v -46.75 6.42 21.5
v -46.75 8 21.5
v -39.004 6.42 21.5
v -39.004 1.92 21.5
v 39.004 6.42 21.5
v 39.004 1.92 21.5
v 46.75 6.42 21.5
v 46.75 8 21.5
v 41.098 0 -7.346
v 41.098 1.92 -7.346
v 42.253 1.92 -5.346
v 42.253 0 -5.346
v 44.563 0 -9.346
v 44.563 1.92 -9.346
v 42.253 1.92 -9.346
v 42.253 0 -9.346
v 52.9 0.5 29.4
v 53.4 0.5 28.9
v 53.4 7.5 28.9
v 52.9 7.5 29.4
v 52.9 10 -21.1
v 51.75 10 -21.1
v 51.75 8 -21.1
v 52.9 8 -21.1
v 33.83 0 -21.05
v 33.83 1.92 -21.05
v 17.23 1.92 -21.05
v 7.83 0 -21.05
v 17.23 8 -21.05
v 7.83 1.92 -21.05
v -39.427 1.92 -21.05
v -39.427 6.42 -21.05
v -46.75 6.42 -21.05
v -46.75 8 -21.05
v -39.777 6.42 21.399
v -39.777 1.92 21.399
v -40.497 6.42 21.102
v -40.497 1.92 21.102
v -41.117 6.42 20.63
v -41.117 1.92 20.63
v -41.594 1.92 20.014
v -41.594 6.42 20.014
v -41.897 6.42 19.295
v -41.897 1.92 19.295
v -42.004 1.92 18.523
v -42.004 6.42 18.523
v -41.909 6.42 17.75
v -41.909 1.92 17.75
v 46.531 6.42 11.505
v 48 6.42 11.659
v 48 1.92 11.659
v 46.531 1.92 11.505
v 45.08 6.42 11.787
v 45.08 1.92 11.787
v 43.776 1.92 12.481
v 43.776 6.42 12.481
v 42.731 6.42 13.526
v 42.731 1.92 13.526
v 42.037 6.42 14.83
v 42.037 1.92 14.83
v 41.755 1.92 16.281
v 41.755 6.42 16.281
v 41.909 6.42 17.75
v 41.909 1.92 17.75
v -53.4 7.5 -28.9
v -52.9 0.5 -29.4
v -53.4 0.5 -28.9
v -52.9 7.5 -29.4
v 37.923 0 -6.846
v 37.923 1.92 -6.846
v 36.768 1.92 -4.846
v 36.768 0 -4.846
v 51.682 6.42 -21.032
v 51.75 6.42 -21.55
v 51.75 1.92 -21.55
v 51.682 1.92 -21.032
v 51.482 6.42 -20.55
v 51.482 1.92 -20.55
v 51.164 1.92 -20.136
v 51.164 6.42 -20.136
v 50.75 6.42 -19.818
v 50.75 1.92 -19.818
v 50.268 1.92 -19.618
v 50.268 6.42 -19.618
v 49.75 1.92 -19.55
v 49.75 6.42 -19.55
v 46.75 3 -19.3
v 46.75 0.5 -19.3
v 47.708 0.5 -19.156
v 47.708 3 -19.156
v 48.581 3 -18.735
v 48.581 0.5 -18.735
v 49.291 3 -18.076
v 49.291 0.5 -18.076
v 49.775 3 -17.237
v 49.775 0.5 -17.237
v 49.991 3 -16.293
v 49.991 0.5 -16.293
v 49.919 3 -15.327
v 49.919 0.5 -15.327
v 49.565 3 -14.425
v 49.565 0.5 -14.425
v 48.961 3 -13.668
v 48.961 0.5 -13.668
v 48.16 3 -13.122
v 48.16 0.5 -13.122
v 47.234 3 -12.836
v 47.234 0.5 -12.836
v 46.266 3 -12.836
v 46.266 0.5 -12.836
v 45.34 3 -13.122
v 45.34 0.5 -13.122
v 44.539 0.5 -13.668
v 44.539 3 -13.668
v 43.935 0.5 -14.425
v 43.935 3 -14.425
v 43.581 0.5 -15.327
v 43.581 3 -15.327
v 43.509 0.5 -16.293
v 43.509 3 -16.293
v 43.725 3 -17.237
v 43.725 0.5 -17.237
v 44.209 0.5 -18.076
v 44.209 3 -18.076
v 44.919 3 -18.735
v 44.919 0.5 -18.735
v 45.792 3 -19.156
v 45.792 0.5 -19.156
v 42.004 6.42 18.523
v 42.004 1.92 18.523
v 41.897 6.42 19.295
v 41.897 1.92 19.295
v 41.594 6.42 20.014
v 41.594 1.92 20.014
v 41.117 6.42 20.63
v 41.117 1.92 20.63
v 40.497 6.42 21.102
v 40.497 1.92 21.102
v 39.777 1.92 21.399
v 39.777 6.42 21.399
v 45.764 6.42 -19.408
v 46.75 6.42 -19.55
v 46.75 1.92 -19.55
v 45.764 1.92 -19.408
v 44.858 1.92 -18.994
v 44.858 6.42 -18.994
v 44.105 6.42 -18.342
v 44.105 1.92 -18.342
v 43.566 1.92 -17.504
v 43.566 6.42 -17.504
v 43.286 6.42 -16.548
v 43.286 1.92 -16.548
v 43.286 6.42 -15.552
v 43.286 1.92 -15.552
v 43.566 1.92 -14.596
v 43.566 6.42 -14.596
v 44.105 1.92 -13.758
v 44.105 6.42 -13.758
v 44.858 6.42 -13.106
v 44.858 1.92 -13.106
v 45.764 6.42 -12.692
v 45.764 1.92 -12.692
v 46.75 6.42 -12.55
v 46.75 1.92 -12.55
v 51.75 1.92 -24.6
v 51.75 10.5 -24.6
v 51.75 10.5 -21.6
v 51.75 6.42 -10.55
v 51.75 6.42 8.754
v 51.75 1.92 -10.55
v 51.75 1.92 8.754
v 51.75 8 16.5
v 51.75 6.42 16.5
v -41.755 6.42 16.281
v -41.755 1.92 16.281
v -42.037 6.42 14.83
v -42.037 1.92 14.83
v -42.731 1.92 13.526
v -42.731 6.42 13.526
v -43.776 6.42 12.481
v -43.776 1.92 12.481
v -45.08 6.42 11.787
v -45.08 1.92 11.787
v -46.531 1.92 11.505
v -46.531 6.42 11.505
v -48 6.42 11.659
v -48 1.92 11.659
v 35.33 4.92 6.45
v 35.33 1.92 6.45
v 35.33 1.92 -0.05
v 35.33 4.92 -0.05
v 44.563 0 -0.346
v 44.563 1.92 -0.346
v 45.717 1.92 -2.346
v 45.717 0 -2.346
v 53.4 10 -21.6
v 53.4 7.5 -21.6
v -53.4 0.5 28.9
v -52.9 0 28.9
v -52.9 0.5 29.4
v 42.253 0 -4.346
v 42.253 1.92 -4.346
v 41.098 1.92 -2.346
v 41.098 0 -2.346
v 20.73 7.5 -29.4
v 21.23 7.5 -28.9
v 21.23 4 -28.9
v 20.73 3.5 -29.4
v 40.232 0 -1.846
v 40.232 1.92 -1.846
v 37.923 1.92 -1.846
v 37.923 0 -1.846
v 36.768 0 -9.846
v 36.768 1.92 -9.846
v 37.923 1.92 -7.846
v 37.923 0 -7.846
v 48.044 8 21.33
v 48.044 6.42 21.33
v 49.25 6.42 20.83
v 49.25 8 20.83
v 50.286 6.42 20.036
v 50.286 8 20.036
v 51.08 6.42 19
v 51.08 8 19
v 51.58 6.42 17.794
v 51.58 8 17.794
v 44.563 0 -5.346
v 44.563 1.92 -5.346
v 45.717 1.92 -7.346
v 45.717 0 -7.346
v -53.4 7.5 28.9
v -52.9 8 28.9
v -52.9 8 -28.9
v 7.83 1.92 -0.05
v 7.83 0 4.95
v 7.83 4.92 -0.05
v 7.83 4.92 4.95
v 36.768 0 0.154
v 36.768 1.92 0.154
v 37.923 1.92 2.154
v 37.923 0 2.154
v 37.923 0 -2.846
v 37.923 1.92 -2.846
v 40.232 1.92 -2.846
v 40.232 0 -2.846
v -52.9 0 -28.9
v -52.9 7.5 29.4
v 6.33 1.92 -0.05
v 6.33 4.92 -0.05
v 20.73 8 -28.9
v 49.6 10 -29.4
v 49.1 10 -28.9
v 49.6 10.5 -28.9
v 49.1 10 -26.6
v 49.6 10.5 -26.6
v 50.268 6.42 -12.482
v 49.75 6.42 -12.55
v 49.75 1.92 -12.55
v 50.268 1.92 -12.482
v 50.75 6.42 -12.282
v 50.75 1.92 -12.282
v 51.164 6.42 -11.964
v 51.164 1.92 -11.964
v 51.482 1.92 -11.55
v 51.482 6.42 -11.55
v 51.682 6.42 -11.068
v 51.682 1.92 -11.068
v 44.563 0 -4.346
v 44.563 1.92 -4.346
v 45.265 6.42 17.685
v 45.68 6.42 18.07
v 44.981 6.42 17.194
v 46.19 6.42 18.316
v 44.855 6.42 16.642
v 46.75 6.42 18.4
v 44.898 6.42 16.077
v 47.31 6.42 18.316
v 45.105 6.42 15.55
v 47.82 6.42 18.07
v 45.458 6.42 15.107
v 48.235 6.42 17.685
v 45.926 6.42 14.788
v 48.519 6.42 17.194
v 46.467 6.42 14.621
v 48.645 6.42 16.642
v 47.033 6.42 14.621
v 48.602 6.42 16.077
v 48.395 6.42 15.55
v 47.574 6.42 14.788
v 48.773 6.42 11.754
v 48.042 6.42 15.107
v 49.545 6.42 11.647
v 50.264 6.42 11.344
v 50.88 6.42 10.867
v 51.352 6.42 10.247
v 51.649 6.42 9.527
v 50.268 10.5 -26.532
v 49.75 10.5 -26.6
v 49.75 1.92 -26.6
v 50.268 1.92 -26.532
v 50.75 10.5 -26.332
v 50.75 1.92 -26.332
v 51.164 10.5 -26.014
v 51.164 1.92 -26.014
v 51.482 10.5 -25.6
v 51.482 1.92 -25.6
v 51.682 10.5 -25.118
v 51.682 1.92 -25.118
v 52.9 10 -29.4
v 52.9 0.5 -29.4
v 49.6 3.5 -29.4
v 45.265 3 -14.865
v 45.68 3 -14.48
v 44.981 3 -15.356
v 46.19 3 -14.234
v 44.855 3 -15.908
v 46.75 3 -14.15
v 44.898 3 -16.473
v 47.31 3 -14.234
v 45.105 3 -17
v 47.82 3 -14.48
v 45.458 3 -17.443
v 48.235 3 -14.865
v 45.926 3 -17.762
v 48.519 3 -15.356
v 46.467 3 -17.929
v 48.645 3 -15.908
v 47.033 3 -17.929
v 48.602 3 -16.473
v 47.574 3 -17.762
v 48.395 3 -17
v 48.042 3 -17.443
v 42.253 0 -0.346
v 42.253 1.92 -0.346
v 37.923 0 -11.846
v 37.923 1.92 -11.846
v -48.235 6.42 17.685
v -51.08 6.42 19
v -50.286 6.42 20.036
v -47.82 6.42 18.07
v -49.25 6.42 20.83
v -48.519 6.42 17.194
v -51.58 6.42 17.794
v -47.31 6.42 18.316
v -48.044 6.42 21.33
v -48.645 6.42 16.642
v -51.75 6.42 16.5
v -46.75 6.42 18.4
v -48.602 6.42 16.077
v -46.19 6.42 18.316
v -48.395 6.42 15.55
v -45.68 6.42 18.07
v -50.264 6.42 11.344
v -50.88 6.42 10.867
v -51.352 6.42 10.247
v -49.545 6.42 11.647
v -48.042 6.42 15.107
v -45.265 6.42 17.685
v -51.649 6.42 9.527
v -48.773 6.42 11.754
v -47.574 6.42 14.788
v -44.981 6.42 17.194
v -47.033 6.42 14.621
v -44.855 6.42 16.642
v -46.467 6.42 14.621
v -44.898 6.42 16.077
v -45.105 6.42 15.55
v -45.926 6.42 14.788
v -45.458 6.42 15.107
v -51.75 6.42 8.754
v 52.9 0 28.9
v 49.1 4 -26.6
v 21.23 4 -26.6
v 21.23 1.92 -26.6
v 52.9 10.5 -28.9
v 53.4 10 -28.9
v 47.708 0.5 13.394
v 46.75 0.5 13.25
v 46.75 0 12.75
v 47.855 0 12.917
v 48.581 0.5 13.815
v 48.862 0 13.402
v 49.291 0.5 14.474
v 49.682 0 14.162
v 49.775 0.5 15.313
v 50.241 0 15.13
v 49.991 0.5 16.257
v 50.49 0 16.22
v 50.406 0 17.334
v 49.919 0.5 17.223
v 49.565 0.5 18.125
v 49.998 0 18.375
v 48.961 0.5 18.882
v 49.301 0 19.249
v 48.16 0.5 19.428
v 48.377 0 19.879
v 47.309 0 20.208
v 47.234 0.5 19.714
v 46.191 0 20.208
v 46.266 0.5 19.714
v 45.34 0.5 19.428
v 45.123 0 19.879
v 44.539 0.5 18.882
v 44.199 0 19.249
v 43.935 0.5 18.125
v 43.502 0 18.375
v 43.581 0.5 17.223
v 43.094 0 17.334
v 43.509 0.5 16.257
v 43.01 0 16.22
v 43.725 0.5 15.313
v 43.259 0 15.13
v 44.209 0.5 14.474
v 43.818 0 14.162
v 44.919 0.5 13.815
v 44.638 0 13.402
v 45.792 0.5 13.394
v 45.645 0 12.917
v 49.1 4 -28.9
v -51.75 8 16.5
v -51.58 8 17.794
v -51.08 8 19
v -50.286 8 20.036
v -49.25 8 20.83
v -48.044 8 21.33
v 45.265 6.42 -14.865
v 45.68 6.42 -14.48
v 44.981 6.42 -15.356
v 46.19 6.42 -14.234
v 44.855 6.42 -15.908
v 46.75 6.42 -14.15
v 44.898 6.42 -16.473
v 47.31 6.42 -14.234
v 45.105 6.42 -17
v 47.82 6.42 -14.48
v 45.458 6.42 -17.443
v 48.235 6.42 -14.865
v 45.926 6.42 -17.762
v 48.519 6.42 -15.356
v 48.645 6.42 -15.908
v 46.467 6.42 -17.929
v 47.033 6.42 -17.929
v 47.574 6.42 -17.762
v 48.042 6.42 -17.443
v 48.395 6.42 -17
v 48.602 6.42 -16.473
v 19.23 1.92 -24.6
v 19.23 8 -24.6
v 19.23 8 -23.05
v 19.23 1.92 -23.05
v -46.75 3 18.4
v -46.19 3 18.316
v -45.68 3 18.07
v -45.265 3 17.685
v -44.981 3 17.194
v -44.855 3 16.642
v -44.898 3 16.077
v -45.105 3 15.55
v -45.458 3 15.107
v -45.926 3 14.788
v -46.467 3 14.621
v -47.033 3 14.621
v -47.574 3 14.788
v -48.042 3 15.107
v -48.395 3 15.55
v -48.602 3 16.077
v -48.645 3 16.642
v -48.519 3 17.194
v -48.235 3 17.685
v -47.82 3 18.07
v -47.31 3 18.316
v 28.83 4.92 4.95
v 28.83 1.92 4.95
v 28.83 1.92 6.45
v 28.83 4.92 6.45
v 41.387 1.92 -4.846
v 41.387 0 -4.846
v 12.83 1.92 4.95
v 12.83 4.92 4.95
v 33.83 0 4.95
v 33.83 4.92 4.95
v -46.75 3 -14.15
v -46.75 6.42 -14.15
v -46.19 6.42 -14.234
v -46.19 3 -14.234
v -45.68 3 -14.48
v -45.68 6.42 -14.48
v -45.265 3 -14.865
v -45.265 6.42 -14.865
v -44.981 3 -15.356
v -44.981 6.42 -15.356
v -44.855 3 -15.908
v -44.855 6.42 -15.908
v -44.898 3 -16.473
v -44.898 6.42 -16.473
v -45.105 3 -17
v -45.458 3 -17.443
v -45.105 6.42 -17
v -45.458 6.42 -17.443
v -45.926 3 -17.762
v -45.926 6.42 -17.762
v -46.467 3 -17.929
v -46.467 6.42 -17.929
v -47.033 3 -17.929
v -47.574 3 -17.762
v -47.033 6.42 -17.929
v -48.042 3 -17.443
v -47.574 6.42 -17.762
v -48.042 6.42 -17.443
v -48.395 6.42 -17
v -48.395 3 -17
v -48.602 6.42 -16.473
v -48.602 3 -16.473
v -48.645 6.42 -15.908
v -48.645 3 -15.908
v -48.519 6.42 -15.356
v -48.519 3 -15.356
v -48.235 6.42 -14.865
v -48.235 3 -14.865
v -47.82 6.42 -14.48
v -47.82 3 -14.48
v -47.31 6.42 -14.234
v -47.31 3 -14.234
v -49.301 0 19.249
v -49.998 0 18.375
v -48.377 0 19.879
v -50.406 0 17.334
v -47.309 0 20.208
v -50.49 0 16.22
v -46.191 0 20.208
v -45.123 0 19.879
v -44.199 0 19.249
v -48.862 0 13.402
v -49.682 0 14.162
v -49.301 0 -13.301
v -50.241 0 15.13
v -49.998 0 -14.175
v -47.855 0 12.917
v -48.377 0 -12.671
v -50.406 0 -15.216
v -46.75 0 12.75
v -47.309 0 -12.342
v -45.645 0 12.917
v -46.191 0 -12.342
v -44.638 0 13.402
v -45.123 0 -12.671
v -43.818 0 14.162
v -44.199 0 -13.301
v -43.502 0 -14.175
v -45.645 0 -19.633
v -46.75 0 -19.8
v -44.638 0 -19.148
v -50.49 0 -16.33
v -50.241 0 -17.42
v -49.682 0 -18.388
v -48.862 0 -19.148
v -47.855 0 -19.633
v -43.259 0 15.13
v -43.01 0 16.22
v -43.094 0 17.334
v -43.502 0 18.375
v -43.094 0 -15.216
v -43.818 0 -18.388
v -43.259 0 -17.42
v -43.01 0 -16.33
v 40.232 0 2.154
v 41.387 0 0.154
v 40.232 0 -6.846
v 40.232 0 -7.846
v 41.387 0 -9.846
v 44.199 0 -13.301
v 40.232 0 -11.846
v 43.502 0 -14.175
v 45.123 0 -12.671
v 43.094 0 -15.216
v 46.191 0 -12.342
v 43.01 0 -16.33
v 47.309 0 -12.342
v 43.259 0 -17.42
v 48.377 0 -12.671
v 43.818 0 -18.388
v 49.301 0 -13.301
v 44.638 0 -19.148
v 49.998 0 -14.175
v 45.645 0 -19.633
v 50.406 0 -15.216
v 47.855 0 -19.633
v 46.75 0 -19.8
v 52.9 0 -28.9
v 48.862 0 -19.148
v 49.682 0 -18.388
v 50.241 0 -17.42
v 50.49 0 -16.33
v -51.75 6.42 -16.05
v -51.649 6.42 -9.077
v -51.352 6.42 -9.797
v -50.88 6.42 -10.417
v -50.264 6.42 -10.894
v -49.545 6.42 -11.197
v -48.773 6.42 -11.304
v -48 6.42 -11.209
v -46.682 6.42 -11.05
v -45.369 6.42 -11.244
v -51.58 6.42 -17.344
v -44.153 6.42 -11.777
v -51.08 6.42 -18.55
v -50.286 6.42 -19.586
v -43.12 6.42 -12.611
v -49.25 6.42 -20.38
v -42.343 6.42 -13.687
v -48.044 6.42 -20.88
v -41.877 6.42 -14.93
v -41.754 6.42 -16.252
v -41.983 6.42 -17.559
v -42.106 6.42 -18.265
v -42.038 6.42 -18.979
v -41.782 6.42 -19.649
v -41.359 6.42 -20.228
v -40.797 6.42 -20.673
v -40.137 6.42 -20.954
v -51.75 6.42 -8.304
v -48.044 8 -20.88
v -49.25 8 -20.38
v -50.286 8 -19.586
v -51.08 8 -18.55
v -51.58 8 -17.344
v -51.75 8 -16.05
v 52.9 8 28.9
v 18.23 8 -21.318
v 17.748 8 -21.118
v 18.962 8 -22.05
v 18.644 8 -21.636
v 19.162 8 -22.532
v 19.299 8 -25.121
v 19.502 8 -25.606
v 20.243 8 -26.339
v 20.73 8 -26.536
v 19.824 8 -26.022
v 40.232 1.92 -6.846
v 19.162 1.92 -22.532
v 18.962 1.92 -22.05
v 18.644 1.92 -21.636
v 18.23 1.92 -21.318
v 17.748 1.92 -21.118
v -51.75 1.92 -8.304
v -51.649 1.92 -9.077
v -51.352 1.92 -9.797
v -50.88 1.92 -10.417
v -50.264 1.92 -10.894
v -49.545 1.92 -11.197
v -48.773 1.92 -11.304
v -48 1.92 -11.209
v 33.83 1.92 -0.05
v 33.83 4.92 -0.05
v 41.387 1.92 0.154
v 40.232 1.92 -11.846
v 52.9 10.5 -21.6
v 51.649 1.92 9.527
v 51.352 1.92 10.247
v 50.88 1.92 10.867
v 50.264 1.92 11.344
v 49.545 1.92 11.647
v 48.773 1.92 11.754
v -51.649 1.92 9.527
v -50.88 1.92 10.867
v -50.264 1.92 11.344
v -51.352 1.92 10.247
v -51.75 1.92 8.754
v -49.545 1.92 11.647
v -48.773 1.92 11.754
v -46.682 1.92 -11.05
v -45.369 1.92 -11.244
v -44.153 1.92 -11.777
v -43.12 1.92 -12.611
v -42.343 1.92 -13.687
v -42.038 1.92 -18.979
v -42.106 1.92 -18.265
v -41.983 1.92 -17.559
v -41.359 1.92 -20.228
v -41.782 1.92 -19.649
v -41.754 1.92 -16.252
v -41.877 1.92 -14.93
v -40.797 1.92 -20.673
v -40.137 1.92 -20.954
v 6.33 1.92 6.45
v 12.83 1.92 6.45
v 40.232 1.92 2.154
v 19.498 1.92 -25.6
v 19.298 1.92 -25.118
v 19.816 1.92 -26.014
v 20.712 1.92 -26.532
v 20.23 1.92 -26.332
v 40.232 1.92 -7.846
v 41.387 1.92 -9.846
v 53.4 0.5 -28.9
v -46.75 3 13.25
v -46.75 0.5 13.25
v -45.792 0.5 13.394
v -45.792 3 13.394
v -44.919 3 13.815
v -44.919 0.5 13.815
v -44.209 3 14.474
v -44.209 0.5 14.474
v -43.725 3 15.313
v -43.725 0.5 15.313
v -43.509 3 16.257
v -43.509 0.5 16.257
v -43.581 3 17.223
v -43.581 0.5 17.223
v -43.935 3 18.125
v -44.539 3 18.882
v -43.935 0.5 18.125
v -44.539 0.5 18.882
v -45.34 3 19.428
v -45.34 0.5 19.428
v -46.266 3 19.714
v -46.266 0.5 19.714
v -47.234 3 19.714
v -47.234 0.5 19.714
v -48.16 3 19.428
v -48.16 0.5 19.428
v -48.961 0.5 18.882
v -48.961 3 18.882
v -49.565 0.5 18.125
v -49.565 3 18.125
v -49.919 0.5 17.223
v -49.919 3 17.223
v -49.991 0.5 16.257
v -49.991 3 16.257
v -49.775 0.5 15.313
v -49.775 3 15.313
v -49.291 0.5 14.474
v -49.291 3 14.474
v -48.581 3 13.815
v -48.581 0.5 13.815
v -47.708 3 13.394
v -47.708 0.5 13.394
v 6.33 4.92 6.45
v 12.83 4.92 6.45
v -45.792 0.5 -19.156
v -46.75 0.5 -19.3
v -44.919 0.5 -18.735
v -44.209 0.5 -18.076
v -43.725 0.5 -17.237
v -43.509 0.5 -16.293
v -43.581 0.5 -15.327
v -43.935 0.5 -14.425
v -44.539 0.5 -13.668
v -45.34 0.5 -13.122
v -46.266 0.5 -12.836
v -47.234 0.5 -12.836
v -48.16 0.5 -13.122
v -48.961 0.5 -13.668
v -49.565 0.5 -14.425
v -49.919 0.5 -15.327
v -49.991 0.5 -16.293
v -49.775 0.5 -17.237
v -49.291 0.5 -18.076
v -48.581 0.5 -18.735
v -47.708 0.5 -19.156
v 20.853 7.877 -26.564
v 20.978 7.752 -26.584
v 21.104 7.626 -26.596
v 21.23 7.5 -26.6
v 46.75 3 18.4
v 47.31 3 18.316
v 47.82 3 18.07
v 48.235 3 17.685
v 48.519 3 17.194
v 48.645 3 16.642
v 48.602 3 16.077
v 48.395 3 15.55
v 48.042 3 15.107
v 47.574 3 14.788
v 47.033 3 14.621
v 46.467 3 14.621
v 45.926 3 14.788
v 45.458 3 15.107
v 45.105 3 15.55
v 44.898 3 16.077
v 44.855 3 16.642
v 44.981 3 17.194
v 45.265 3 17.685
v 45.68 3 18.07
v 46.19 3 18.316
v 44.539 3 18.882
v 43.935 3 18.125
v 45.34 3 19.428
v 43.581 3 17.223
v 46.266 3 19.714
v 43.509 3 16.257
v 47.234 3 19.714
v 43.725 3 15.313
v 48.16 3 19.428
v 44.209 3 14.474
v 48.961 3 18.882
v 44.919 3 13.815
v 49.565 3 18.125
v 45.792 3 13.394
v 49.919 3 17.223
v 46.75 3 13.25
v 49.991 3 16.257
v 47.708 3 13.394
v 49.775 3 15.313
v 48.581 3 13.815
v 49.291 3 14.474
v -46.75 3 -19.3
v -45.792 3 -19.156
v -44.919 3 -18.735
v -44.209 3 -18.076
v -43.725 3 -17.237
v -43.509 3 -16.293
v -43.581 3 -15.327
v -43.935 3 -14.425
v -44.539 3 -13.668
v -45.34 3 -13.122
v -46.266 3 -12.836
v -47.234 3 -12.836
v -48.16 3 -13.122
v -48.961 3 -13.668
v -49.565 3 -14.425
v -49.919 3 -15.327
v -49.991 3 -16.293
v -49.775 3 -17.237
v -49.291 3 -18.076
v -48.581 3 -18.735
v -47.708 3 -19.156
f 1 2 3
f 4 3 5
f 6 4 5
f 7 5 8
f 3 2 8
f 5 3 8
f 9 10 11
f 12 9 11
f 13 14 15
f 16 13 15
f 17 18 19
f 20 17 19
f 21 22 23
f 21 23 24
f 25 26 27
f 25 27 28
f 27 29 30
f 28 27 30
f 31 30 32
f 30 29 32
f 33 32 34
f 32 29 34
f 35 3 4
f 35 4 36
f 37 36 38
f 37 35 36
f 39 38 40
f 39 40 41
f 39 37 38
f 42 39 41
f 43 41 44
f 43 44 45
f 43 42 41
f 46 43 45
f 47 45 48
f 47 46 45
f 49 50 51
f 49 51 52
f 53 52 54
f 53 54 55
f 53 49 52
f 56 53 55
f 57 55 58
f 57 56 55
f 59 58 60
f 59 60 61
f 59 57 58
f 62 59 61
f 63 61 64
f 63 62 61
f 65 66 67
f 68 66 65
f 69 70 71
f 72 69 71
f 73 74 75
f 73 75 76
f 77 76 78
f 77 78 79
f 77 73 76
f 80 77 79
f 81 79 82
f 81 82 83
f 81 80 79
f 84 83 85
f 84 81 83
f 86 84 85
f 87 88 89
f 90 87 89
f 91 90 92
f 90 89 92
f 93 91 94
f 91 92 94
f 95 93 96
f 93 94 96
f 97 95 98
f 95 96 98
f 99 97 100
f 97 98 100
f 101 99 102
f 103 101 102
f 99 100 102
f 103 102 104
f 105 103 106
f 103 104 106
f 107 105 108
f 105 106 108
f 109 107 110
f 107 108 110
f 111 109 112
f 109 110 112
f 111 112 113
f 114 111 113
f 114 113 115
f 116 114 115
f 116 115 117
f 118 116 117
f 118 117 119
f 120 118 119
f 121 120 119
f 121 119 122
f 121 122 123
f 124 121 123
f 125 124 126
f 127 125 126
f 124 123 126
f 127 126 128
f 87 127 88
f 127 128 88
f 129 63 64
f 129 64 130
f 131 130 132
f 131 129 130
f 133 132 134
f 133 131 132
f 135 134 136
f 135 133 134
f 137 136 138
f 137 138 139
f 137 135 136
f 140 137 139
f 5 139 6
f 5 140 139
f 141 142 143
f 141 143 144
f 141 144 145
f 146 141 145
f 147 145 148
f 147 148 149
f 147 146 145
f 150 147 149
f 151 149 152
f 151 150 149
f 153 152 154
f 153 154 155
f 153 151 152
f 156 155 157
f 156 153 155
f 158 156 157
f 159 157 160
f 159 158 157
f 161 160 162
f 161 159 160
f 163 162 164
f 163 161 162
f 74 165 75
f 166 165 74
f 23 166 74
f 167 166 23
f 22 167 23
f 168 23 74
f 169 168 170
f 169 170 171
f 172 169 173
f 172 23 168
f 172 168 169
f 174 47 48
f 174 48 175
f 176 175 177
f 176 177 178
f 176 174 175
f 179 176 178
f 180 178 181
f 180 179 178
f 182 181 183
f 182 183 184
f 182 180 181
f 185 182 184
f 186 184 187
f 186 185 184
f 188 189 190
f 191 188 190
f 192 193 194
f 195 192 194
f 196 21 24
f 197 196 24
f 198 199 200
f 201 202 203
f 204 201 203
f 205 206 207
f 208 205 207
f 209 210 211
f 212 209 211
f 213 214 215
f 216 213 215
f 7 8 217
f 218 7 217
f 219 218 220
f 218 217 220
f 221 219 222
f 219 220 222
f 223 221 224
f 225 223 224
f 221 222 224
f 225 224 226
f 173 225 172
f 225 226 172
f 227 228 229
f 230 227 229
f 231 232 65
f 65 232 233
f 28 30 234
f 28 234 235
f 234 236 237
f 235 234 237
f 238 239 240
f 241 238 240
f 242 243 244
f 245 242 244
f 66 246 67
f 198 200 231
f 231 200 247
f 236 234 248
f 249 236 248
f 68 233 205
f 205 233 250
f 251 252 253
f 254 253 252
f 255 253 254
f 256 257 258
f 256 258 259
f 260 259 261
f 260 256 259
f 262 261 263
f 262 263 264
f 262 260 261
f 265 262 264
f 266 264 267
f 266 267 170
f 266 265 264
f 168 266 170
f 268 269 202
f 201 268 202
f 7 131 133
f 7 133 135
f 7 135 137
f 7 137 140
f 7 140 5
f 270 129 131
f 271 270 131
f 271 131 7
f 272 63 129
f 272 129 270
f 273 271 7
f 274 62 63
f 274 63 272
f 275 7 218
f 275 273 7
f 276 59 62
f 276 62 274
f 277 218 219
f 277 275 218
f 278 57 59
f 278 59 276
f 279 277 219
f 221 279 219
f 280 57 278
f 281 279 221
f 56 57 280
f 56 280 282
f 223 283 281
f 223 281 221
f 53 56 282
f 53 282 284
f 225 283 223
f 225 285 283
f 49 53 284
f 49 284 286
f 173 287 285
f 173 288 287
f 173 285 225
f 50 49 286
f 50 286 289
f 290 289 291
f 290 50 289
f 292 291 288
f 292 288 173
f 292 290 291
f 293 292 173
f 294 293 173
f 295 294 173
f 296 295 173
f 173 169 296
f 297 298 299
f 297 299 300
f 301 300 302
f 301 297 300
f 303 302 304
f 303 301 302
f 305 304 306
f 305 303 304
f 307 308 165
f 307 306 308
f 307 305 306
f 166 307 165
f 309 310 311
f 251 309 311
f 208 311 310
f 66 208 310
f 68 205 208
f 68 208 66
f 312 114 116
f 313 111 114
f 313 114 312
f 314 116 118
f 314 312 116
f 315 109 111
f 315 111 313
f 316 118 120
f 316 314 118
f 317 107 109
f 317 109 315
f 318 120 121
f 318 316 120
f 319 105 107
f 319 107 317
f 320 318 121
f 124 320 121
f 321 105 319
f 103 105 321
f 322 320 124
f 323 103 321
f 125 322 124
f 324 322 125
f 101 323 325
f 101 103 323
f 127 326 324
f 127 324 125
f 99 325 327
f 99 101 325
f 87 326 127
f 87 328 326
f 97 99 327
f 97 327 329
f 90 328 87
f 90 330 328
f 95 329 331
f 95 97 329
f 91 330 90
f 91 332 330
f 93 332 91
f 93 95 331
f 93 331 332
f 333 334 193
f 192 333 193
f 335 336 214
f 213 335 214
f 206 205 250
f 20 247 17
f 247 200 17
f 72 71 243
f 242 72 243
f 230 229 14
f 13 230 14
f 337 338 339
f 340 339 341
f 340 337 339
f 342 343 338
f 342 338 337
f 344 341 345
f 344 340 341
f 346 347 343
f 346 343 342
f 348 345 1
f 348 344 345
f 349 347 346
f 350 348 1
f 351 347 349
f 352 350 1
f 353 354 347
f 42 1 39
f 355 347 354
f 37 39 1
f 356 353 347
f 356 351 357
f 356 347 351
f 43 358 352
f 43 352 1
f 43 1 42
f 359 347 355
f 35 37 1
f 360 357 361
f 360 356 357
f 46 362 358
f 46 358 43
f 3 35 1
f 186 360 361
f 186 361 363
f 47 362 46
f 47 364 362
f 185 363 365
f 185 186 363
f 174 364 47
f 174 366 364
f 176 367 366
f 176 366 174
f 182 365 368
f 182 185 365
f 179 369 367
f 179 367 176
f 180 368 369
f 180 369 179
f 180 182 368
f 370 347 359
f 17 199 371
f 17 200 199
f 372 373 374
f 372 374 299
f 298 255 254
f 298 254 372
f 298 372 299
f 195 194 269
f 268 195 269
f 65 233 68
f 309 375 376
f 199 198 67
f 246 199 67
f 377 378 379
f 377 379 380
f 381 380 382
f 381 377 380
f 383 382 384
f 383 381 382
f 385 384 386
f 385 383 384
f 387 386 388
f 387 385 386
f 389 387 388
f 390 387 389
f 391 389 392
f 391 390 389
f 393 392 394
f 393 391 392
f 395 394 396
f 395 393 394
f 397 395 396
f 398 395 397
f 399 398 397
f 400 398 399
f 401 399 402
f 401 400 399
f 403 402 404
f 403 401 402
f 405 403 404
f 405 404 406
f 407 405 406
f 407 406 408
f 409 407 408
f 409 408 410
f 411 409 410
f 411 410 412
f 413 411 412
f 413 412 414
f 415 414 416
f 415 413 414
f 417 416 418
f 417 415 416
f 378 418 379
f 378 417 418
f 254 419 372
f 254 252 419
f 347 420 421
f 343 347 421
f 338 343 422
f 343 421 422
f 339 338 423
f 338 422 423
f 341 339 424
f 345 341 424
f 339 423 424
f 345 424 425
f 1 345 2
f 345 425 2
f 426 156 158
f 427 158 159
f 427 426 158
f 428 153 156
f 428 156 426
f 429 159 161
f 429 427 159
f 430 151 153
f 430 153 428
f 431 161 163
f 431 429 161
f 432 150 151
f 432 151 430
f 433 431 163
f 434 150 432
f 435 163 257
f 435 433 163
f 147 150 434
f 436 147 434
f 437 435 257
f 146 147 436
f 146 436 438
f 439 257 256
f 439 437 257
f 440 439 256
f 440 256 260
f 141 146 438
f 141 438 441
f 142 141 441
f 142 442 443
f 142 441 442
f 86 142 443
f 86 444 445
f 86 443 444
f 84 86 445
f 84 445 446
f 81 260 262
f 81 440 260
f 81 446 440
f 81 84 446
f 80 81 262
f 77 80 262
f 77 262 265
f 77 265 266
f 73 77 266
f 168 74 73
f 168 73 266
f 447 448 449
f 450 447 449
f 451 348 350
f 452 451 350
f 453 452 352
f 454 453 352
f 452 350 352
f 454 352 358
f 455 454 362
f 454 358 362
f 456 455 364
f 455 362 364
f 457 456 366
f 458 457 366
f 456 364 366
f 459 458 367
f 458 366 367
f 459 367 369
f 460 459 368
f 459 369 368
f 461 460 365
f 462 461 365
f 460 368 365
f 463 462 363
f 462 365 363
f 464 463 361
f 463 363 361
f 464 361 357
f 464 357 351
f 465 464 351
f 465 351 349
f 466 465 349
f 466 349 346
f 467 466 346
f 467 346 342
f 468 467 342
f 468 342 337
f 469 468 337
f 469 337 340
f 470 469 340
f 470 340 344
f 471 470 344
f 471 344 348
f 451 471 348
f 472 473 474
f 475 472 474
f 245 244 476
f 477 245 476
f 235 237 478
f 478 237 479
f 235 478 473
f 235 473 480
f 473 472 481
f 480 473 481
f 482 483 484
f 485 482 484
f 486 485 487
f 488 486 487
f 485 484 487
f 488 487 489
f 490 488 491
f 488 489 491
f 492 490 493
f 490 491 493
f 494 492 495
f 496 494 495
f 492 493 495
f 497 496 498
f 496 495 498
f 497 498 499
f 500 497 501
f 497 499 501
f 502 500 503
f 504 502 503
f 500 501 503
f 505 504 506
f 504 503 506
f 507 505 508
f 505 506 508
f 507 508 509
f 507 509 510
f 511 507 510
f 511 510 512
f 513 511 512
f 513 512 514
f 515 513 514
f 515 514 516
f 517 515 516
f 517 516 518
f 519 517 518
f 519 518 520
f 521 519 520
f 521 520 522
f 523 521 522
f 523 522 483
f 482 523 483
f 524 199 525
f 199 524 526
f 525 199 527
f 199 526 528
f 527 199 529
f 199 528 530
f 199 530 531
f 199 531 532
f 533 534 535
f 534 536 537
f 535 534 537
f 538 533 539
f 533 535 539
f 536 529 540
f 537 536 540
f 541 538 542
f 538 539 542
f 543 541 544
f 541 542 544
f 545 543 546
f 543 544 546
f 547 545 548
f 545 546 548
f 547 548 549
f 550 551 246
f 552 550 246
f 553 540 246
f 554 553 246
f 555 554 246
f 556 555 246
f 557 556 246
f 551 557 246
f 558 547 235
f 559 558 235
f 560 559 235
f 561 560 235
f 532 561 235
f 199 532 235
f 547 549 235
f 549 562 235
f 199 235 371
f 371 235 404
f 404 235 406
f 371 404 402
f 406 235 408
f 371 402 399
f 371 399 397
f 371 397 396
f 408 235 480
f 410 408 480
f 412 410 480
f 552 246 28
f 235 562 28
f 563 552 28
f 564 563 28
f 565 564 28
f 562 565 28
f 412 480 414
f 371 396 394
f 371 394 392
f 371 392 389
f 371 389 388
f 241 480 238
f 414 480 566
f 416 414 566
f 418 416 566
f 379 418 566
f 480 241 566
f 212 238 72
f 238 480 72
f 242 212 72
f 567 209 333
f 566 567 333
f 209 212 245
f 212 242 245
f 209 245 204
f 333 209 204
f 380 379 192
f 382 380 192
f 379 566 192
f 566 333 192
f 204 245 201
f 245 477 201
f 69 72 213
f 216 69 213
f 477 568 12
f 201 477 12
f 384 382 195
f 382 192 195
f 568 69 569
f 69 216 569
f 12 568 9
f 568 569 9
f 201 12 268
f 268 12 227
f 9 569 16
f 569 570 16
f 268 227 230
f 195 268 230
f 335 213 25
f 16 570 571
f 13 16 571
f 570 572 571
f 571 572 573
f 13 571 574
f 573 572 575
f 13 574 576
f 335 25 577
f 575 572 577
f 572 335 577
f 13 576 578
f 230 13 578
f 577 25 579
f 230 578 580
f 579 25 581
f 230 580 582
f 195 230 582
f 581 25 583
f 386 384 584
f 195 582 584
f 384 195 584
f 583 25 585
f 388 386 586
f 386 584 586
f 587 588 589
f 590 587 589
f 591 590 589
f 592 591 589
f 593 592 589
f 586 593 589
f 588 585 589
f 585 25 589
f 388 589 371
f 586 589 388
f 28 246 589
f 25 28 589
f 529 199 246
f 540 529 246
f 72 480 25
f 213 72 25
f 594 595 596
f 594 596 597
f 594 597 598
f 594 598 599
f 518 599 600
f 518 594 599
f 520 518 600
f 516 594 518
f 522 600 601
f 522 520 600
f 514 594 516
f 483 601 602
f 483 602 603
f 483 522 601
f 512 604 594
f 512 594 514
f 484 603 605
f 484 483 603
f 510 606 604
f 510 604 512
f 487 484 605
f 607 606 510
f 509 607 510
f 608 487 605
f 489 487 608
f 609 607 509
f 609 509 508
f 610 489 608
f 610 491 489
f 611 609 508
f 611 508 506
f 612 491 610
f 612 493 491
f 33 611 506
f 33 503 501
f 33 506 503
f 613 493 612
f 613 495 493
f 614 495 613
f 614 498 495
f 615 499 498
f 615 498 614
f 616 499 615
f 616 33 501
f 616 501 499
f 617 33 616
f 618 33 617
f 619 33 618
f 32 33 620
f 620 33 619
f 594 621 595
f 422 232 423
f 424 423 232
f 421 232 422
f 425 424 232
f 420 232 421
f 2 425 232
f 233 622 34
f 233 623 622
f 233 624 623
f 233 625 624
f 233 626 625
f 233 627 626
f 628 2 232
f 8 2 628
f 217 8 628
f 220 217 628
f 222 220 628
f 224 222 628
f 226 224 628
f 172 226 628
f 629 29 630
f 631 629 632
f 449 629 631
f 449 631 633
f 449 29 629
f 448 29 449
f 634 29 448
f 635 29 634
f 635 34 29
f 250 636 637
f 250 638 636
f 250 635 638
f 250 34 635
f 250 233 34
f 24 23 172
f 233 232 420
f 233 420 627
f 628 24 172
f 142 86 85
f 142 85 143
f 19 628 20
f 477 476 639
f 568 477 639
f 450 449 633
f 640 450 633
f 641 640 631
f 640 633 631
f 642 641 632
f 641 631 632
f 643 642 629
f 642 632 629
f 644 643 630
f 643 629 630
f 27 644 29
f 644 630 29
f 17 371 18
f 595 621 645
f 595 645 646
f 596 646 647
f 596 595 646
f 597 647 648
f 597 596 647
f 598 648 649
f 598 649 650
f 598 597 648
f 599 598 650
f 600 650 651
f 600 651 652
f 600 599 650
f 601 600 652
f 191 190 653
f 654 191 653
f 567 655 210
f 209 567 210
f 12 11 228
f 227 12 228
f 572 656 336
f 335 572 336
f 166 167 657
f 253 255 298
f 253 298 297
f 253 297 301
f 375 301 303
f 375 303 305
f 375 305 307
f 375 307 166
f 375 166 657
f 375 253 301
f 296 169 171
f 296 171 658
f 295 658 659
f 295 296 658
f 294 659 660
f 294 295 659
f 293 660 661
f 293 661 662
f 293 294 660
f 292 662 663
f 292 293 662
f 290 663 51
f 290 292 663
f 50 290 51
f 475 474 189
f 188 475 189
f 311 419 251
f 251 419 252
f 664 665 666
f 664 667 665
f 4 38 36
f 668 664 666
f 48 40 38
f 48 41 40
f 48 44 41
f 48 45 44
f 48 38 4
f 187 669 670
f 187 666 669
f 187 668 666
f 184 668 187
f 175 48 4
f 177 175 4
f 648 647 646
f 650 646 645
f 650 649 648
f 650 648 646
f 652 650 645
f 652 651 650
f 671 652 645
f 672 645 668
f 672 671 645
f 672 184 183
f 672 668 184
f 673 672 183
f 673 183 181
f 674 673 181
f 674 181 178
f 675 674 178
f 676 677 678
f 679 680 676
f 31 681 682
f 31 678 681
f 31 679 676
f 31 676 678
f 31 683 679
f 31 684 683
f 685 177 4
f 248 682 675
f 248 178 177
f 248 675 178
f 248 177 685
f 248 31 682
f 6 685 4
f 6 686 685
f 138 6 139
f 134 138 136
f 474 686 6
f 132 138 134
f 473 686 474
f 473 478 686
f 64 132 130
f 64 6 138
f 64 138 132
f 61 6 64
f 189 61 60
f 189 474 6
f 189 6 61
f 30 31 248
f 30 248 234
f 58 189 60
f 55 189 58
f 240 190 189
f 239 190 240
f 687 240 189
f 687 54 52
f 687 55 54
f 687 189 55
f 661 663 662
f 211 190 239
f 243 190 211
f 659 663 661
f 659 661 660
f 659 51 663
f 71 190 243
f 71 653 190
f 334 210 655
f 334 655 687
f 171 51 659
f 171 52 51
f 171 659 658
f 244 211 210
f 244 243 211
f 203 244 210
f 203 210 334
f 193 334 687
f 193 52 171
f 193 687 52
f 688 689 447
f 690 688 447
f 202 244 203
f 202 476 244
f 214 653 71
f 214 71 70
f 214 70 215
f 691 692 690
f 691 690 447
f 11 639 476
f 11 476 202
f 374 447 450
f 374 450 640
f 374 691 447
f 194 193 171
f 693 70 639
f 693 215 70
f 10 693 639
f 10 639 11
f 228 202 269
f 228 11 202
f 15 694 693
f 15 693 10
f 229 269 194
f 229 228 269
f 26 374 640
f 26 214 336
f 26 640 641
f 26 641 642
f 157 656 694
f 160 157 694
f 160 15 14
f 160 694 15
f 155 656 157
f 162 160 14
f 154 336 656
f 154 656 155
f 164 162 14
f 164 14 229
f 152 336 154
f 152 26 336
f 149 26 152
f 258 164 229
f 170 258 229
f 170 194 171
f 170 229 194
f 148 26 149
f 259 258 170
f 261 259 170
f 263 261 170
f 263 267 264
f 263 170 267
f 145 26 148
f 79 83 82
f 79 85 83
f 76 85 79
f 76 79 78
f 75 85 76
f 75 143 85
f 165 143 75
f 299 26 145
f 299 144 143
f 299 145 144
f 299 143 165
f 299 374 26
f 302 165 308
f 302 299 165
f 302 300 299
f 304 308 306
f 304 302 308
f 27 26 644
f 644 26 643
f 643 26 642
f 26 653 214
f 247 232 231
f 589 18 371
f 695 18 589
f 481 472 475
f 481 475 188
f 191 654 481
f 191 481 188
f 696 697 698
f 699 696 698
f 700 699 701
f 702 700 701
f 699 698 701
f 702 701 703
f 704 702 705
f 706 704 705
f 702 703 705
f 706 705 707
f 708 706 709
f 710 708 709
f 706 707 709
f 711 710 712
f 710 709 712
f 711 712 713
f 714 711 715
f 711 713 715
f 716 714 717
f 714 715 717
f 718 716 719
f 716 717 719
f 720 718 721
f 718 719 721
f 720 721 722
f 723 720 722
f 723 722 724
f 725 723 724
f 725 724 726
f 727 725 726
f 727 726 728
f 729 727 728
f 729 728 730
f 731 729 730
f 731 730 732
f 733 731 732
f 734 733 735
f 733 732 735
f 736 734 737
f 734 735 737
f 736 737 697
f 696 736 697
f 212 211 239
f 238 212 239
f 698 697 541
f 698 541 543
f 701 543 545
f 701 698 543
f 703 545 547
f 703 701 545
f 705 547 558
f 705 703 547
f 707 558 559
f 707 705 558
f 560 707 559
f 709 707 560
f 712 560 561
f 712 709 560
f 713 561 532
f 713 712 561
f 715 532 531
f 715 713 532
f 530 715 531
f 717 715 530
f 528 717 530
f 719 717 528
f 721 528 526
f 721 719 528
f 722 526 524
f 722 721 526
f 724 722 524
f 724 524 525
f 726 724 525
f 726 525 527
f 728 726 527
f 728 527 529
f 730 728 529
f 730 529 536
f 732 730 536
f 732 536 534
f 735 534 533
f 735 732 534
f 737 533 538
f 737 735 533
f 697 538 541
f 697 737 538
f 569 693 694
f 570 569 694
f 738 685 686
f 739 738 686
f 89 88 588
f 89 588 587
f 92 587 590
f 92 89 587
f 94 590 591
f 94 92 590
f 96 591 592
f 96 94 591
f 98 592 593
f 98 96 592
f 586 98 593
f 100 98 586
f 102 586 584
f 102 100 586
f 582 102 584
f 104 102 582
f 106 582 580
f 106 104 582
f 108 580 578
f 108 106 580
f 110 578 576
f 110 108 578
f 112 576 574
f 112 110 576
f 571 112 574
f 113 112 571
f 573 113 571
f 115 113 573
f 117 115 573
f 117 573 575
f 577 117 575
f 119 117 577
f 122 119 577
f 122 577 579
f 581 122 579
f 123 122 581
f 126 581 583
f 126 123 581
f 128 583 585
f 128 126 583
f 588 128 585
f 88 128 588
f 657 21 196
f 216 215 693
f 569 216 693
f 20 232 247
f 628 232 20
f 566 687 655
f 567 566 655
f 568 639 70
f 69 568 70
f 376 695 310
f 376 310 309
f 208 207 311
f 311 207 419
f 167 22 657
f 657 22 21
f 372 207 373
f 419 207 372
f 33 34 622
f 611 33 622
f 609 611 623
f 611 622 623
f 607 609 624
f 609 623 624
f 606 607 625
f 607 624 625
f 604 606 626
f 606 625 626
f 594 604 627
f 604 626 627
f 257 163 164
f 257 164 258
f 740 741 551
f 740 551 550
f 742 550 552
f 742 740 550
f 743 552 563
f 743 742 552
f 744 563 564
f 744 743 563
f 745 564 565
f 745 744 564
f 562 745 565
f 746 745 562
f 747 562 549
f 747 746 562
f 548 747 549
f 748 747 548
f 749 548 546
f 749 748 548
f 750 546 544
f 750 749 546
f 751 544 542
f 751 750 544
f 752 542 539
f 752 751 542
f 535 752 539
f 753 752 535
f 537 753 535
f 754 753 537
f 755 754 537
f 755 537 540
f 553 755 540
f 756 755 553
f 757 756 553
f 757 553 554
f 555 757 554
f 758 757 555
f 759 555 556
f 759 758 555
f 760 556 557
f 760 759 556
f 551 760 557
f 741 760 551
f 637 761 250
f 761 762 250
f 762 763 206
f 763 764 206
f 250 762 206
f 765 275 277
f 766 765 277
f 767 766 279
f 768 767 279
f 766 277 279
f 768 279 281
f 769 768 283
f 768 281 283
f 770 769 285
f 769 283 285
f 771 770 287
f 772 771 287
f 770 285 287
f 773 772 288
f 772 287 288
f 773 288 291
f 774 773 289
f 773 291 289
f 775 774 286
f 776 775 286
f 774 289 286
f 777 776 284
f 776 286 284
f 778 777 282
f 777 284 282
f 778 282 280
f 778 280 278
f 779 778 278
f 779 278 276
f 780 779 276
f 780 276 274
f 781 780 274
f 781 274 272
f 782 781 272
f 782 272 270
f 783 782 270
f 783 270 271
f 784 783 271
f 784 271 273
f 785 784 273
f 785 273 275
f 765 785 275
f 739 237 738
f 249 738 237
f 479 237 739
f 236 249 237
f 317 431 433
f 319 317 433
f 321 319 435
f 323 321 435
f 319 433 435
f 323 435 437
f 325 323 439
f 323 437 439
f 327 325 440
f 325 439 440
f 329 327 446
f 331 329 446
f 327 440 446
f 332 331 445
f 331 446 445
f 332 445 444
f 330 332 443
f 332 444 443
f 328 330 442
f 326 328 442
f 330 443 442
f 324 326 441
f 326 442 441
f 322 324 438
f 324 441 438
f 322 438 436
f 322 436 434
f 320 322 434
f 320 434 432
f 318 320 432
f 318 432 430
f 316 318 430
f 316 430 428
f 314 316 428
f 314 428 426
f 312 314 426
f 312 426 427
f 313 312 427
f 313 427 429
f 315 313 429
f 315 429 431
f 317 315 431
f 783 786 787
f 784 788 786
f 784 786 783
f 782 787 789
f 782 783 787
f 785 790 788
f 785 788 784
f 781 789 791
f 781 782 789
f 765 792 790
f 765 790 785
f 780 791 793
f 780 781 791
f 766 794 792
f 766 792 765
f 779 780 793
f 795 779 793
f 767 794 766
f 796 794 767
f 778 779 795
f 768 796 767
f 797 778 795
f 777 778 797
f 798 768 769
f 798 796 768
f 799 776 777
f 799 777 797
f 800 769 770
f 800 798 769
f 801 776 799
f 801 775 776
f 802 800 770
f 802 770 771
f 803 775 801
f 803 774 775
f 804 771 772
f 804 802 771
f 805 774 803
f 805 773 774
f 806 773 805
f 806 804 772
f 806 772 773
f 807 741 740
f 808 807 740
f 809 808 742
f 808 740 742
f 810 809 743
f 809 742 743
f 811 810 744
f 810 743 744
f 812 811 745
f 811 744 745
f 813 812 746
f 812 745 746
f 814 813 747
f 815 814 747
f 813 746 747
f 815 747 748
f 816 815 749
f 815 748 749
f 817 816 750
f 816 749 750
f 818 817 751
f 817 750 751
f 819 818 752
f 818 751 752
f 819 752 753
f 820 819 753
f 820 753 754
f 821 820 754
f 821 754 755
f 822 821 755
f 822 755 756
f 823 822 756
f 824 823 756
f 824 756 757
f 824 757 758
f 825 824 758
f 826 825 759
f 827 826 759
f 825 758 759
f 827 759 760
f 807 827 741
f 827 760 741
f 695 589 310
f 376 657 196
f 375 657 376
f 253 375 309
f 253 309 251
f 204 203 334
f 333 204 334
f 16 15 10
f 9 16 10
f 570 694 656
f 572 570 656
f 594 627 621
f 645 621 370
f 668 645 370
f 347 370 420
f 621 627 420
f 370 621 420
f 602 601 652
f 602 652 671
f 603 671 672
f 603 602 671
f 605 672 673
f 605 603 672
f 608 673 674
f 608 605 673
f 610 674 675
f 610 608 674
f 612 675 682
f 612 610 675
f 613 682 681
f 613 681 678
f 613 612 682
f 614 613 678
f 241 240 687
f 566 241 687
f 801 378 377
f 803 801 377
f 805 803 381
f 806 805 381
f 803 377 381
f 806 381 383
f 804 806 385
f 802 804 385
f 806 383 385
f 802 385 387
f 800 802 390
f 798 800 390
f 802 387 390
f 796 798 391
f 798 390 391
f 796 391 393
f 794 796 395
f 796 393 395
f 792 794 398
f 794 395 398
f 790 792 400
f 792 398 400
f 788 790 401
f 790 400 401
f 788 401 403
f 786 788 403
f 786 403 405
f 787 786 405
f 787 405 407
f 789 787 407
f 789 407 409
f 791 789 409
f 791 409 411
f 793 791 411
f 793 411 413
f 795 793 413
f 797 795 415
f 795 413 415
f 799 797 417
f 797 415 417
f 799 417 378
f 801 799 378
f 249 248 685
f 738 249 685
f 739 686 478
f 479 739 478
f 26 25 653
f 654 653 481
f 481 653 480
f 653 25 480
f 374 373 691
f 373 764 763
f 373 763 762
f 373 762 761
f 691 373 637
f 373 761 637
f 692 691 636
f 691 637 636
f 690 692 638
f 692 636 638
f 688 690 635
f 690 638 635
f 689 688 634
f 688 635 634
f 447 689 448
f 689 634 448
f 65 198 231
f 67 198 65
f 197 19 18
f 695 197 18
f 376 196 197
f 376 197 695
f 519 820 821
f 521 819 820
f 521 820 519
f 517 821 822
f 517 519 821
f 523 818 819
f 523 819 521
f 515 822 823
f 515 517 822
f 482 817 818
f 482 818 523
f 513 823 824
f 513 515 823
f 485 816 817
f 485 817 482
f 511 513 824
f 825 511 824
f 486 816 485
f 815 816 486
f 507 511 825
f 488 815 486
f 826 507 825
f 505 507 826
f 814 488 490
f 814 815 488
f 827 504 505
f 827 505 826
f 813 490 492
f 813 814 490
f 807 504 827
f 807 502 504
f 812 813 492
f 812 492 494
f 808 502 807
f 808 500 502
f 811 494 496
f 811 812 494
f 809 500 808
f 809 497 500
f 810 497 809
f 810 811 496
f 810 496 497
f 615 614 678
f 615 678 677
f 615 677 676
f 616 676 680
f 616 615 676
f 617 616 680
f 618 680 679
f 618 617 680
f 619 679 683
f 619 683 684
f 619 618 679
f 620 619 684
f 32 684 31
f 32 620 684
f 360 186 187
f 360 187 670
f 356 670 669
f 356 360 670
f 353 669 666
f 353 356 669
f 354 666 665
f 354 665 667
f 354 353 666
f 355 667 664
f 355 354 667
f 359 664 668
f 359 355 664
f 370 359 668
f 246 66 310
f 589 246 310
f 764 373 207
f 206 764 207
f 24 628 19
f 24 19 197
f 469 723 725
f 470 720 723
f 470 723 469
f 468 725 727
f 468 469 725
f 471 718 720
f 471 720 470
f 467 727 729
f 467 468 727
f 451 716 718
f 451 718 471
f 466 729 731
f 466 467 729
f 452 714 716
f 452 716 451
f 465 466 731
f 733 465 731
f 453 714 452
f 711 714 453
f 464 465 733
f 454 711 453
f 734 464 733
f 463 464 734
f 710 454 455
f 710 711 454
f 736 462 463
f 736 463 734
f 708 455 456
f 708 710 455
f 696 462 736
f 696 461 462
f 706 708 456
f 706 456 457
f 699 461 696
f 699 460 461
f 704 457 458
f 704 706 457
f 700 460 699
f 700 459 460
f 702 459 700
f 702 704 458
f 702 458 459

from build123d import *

# Parameters (mm, degrees)
SKETCH_1_W          = 106.8
SKETCH_1_H          = 58.8
EXTRUDE_1_DEPTH     = 8
CUT_EXTRUDE_1_DEPTH = 6.08
EXTRUDE_START       = 2.5
EXTRUDE_2_DEPTH     = 2.5
SKETCH_4_W          = 27.87
SKETCH_4_H          = 2.8
CUT_EXTRUDE_2_DEPTH = 4
EXTRUDE_START_2     = 4.5
EXTRUDE_3_DEPTH     = 4.5
SKETCH_6_R          = 1.9
CUT_EXTRUDE_3_DEPTH = 38.5
SKETCH_7_R          = 3.25
CUT_EXTRUDE_4_DEPTH = 3
CHAMFER_7_SIZE      = 0.5
CUT_EXTRUDE_5_DEPTH = 3
CHAMFER_6_SIZE      = 0.5
EXTRUDE_4_DEPTH     = 3
CUT_EXTRUDE_6_DEPTH = 3


with BuildPart() as part:
    # 草图1 → 凸台-拉伸1 (new body)
    with BuildSketch(Plane(origin=(0, 0, 0), x_dir=(1, 0, 0), z_dir=(0, 1, 0))):
        Rectangle(SKETCH_1_W, SKETCH_1_H)
    extrude(amount=EXTRUDE_1_DEPTH)

    # 草图2 → 切除-拉伸1 (cut)
    with BuildSketch(Plane(origin=(0, 8, 0), x_dir=(1, 0, 0), z_dir=(0, 1, 0))):
        with BuildLine():
            Line((-46.75, -21.5), (46.75, -21.5))
            ThreePointArc((46.75, -21.5), (50.285533906, -20.035533906), (51.75, -16.5))
            Line((51.75, -16.5), (51.75, 24.6))
            ThreePointArc((51.75, 24.6), (51.164213562, 26.014213562), (49.75, 26.6))
            Line((49.75, 26.6), (21.23, 26.6))
            ThreePointArc((21.23, 26.6), (19.815786438, 26.014213562), (19.23, 24.6))
            Line((19.23, 24.6), (19.23, 23.05))
            ThreePointArc((19.23, 23.05), (18.644213562, 21.635786438), (17.23, 21.05))
            Line((17.23, 21.05), (-46.75, 21.05))
            ThreePointArc((-46.75, 21.05), (-50.285533906, 19.585533906), (-51.75, 16.05))
            Line((-51.75, 16.05), (-51.75, -16.5))
            ThreePointArc((-51.75, -16.5), (-50.285533906, -20.035533906), (-46.75, -21.5))
        make_face()
    extrude(amount=-CUT_EXTRUDE_1_DEPTH, mode=Mode.SUBTRACT)

    # 草图3 → 凸台-拉伸2 (add)
    with BuildSketch(Plane(origin=(0, 8, 0), x_dir=(1, 0, 0), z_dir=(0, 1, 0)).offset(EXTRUDE_START)):
        with BuildLine():
            Line((51.75, 21.1), (53.4, 21.1))
            Line((53.4, 21.1), (53.4, 29.4))
            Line((53.4, 29.4), (49.1, 29.4))
            Line((49.1, 29.4), (49.1, 26.6))
            Line((49.1, 26.6), (49.75, 26.6))
            ThreePointArc((49.75, 26.6), (51.164213562, 26.014213562), (51.75, 24.6))
            Line((51.75, 24.6), (51.75, 21.1))
        make_face()
    extrude(amount=-EXTRUDE_2_DEPTH)

    # 草图4 → 切除-拉伸2 (cut)
    with BuildSketch(Plane(origin=(0, 8, 0), x_dir=(1, 0, 0), z_dir=(0, 1, 0))):
        with Locations((35.165, 28)):
            Rectangle(SKETCH_4_W, SKETCH_4_H)
    extrude(amount=-CUT_EXTRUDE_2_DEPTH, mode=Mode.SUBTRACT)

    # 草图5 → 凸台-拉伸3 (add)
    with BuildSketch(Plane(origin=(0, 1.92, 0), x_dir=(1, 0, 0), z_dir=(0, 1, 0)).offset(EXTRUDE_START_2)):
        with BuildLine():
            Line((49.75, 19.55), (46.75, 19.55))
            ThreePointArc((46.75, 19.55), (43.25, 16.05), (46.75, 12.55))
            Line((46.75, 12.55), (49.75, 12.55))
            ThreePointArc((49.75, 12.55), (51.164213562, 11.964213562), (51.75, 10.55))
            Line((51.75, 10.55), (51.75, 21.55))
            ThreePointArc((51.75, 21.55), (51.164213562, 20.135786438), (49.75, 19.55))
        make_face()
        with BuildLine():
            Line((51.75, -16.5), (51.75, -8.754033308))
            ThreePointArc((51.75, -8.754033308), (50.587117307, -11.125741553), (48, -11.658770817))
            ThreePointArc((48, -11.658770817), (43.214466094, -12.964466094), (41.908770817, -17.75))
            ThreePointArc((41.908770817, -17.75), (41.375741553, -20.337117307), (39.004033308, -21.5))
            Line((39.004033308, -21.5), (46.75, -21.5))
            ThreePointArc((46.75, -21.5), (50.285533906, -20.035533906), (51.75, -16.5))
        make_face()
        with BuildLine():
            Line((-46.75, -21.5), (-39.004033308, -21.5))
            ThreePointArc((-39.004033308, -21.5), (-41.375741553, -20.337117307), (-41.908770817, -17.75))
            ThreePointArc((-41.908770817, -17.75), (-43.214466094, -12.964466094), (-48, -11.658770817))
            ThreePointArc((-48, -11.658770817), (-50.587117307, -11.125741553), (-51.75, -8.754033308))
            Line((-51.75, -8.754033308), (-51.75, -16.5))
            ThreePointArc((-51.75, -16.5), (-50.285533906, -20.035533906), (-46.75, -21.5))
        make_face()
        with BuildLine():
            ThreePointArc((-41.983146282, 17.55900816), (-41.590050849, 19.952787734), (-39.42652828, 21.05))
            Line((-39.42652828, 21.05), (-46.75, 21.05))
            ThreePointArc((-46.75, 21.05), (-50.285533906, 19.585533906), (-51.75, 16.05))
            Line((-51.75, 16.05), (-51.75, 8.304033308))
            ThreePointArc((-51.75, 8.304033308), (-50.587117307, 10.675741553), (-48, 11.208770817))
            ThreePointArc((-48, 11.208770817), (-43.12047612, 12.611023931), (-41.983146282, 17.55900816))
        make_face()
    extrude(amount=-EXTRUDE_3_DEPTH)

    # 草图6 → 切除-拉伸3 (cut)
    with BuildSketch(Plane(origin=(0, 6.42, 0), x_dir=(1, 0, 0), z_dir=(0, 1, 0))):
        with Locations((-46.75, 16.05)):
            Circle(SKETCH_6_R)
        with Locations((-46.75, -16.5)):
            Circle(SKETCH_6_R)
        with Locations((46.75, -16.5)):
            Circle(SKETCH_6_R)
        with Locations((46.75, 16.05)):
            Circle(SKETCH_6_R)
    extrude(amount=-CUT_EXTRUDE_3_DEPTH, mode=Mode.SUBTRACT)

    # 草图7 → 切除-拉伸4 (cut)
    with BuildSketch(Plane.XZ):
        with Locations((-46.75, 16.5)):
            Circle(SKETCH_7_R)
        with Locations((46.75, 16.5)):
            Circle(SKETCH_7_R)
        with Locations((46.75, -16.05)):
            Circle(SKETCH_7_R)
        with Locations((-46.75, -16.05)):
            Circle(SKETCH_7_R)
    extrude(amount=-CUT_EXTRUDE_4_DEPTH, mode=Mode.SUBTRACT)

    # 倒角7
    chamfer_7_edges = [part.edges().sort_by_distance(p)[0] for p in [
        (-50, 0, -16.05),
        (-50, 0, 16.5),
        (43.5, 0, -16.05),
        (43.5, 0, 16.5),
    ]]
    chamfer(chamfer_7_edges, length=CHAMFER_7_SIZE)

    # 草图8 → 切除-拉伸5 (cut)
    with BuildSketch(Plane(origin=(0, 1.92, 0), x_dir=(1, 0, 0), z_dir=(0, 1, 0))):
        Polygon((17.23, 21.05), (7.83, 21.05), (7.83, -4.95), (33.83, -4.95), (33.83, 21.05), align=None)
    extrude(amount=-CUT_EXTRUDE_5_DEPTH, mode=Mode.SUBTRACT)

    # 倒角6
    chamfer_6_edges = [part.edges().sort_by_distance(p)[0] for p in [
        (53.4, 4, 29.4),
        (53.4, 8, 4.15),
        (53.4, 9.25, -21.1),
        (52.575, 10.5, -21.1),
        (49.1, 10.5, -28),
        (21.23, 8, -28),
        (21.23, 6, -29.4),
        (35.165, 4, -29.4),
        (49.1, 7.25, -29.4),
        (51.25, 10.5, -29.4),
        (53.4, 10.5, -25.25),
        (-16.085, 8, -29.4),
        (-53.4, 8, 0),
        (0, 8, 29.4),
        (-53.4, 4, 29.4),
        (0, 0, 29.4),
        (-53.4, 0, 0),
        (-53.4, 4, -29.4),
        (53.4, 0, 0),
        (53.4, 5.25, -29.4),
        (0, 0, -29.4),
    ]]
    chamfer(chamfer_6_edges, length=CHAMFER_6_SIZE)

    # 草图11 → 凸台-拉伸4 (add)
    with BuildSketch(Plane(origin=(0, 1.92, 0), x_dir=(1, 0, 0), z_dir=(0, 1, 0))):
        Polygon((35.33, -6.45), (35.33, 0.05), (33.83, 0.05), (33.83, -4.95), (28.83, -4.95), (28.83, -6.45), align=None)
        Polygon((6.33, 0.05), (6.33, -6.45), (12.83, -6.45), (12.83, -4.95), (7.83, -4.95), (7.83, 0.05), align=None)
    extrude(amount=EXTRUDE_4_DEPTH)

    # 草图12 → 切除-拉伸6 (cut)
    with BuildSketch(Plane(origin=(0, 1.92, 0), x_dir=(1, 0, 0), z_dir=(0, 1, 0))):
        Polygon((36.768275427, 9.845748795), (37.922975965, 7.845748795), (40.232377042, 7.845748795), (41.38707758, 9.845748795), (40.232377042, 11.845748795), (37.922975965, 11.845748795), align=None)
        Polygon((41.098402446, 7.345748795), (42.253102984, 5.345748795), (44.562504061, 5.345748795), (45.717204599, 7.345748795), (44.562504061, 9.345748795), (42.253102984, 9.345748795), align=None)
        Polygon((42.253102984, 4.345748795), (41.098402446, 2.345748795), (42.253102984, 0.345748795), (44.562504061, 0.345748795), (45.717204599, 2.345748795), (44.562504061, 4.345748795), align=None)
        Polygon((37.922975965, 2.845748795), (40.232377042, 2.845748795), (41.38707758, 4.845748795), (40.232377042, 6.845748795), (37.922975965, 6.845748795), (36.768275427, 4.845748795), align=None)
        Polygon((41.38707758, -0.154251205), (40.232377042, 1.845748795), (37.922975965, 1.845748795), (36.768275427, -0.154251205), (37.922975965, -2.154251205), (40.232377042, -2.154251205), align=None)
    extrude(amount=-CUT_EXTRUDE_6_DEPTH, mode=Mode.SUBTRACT)


solid = part.part
